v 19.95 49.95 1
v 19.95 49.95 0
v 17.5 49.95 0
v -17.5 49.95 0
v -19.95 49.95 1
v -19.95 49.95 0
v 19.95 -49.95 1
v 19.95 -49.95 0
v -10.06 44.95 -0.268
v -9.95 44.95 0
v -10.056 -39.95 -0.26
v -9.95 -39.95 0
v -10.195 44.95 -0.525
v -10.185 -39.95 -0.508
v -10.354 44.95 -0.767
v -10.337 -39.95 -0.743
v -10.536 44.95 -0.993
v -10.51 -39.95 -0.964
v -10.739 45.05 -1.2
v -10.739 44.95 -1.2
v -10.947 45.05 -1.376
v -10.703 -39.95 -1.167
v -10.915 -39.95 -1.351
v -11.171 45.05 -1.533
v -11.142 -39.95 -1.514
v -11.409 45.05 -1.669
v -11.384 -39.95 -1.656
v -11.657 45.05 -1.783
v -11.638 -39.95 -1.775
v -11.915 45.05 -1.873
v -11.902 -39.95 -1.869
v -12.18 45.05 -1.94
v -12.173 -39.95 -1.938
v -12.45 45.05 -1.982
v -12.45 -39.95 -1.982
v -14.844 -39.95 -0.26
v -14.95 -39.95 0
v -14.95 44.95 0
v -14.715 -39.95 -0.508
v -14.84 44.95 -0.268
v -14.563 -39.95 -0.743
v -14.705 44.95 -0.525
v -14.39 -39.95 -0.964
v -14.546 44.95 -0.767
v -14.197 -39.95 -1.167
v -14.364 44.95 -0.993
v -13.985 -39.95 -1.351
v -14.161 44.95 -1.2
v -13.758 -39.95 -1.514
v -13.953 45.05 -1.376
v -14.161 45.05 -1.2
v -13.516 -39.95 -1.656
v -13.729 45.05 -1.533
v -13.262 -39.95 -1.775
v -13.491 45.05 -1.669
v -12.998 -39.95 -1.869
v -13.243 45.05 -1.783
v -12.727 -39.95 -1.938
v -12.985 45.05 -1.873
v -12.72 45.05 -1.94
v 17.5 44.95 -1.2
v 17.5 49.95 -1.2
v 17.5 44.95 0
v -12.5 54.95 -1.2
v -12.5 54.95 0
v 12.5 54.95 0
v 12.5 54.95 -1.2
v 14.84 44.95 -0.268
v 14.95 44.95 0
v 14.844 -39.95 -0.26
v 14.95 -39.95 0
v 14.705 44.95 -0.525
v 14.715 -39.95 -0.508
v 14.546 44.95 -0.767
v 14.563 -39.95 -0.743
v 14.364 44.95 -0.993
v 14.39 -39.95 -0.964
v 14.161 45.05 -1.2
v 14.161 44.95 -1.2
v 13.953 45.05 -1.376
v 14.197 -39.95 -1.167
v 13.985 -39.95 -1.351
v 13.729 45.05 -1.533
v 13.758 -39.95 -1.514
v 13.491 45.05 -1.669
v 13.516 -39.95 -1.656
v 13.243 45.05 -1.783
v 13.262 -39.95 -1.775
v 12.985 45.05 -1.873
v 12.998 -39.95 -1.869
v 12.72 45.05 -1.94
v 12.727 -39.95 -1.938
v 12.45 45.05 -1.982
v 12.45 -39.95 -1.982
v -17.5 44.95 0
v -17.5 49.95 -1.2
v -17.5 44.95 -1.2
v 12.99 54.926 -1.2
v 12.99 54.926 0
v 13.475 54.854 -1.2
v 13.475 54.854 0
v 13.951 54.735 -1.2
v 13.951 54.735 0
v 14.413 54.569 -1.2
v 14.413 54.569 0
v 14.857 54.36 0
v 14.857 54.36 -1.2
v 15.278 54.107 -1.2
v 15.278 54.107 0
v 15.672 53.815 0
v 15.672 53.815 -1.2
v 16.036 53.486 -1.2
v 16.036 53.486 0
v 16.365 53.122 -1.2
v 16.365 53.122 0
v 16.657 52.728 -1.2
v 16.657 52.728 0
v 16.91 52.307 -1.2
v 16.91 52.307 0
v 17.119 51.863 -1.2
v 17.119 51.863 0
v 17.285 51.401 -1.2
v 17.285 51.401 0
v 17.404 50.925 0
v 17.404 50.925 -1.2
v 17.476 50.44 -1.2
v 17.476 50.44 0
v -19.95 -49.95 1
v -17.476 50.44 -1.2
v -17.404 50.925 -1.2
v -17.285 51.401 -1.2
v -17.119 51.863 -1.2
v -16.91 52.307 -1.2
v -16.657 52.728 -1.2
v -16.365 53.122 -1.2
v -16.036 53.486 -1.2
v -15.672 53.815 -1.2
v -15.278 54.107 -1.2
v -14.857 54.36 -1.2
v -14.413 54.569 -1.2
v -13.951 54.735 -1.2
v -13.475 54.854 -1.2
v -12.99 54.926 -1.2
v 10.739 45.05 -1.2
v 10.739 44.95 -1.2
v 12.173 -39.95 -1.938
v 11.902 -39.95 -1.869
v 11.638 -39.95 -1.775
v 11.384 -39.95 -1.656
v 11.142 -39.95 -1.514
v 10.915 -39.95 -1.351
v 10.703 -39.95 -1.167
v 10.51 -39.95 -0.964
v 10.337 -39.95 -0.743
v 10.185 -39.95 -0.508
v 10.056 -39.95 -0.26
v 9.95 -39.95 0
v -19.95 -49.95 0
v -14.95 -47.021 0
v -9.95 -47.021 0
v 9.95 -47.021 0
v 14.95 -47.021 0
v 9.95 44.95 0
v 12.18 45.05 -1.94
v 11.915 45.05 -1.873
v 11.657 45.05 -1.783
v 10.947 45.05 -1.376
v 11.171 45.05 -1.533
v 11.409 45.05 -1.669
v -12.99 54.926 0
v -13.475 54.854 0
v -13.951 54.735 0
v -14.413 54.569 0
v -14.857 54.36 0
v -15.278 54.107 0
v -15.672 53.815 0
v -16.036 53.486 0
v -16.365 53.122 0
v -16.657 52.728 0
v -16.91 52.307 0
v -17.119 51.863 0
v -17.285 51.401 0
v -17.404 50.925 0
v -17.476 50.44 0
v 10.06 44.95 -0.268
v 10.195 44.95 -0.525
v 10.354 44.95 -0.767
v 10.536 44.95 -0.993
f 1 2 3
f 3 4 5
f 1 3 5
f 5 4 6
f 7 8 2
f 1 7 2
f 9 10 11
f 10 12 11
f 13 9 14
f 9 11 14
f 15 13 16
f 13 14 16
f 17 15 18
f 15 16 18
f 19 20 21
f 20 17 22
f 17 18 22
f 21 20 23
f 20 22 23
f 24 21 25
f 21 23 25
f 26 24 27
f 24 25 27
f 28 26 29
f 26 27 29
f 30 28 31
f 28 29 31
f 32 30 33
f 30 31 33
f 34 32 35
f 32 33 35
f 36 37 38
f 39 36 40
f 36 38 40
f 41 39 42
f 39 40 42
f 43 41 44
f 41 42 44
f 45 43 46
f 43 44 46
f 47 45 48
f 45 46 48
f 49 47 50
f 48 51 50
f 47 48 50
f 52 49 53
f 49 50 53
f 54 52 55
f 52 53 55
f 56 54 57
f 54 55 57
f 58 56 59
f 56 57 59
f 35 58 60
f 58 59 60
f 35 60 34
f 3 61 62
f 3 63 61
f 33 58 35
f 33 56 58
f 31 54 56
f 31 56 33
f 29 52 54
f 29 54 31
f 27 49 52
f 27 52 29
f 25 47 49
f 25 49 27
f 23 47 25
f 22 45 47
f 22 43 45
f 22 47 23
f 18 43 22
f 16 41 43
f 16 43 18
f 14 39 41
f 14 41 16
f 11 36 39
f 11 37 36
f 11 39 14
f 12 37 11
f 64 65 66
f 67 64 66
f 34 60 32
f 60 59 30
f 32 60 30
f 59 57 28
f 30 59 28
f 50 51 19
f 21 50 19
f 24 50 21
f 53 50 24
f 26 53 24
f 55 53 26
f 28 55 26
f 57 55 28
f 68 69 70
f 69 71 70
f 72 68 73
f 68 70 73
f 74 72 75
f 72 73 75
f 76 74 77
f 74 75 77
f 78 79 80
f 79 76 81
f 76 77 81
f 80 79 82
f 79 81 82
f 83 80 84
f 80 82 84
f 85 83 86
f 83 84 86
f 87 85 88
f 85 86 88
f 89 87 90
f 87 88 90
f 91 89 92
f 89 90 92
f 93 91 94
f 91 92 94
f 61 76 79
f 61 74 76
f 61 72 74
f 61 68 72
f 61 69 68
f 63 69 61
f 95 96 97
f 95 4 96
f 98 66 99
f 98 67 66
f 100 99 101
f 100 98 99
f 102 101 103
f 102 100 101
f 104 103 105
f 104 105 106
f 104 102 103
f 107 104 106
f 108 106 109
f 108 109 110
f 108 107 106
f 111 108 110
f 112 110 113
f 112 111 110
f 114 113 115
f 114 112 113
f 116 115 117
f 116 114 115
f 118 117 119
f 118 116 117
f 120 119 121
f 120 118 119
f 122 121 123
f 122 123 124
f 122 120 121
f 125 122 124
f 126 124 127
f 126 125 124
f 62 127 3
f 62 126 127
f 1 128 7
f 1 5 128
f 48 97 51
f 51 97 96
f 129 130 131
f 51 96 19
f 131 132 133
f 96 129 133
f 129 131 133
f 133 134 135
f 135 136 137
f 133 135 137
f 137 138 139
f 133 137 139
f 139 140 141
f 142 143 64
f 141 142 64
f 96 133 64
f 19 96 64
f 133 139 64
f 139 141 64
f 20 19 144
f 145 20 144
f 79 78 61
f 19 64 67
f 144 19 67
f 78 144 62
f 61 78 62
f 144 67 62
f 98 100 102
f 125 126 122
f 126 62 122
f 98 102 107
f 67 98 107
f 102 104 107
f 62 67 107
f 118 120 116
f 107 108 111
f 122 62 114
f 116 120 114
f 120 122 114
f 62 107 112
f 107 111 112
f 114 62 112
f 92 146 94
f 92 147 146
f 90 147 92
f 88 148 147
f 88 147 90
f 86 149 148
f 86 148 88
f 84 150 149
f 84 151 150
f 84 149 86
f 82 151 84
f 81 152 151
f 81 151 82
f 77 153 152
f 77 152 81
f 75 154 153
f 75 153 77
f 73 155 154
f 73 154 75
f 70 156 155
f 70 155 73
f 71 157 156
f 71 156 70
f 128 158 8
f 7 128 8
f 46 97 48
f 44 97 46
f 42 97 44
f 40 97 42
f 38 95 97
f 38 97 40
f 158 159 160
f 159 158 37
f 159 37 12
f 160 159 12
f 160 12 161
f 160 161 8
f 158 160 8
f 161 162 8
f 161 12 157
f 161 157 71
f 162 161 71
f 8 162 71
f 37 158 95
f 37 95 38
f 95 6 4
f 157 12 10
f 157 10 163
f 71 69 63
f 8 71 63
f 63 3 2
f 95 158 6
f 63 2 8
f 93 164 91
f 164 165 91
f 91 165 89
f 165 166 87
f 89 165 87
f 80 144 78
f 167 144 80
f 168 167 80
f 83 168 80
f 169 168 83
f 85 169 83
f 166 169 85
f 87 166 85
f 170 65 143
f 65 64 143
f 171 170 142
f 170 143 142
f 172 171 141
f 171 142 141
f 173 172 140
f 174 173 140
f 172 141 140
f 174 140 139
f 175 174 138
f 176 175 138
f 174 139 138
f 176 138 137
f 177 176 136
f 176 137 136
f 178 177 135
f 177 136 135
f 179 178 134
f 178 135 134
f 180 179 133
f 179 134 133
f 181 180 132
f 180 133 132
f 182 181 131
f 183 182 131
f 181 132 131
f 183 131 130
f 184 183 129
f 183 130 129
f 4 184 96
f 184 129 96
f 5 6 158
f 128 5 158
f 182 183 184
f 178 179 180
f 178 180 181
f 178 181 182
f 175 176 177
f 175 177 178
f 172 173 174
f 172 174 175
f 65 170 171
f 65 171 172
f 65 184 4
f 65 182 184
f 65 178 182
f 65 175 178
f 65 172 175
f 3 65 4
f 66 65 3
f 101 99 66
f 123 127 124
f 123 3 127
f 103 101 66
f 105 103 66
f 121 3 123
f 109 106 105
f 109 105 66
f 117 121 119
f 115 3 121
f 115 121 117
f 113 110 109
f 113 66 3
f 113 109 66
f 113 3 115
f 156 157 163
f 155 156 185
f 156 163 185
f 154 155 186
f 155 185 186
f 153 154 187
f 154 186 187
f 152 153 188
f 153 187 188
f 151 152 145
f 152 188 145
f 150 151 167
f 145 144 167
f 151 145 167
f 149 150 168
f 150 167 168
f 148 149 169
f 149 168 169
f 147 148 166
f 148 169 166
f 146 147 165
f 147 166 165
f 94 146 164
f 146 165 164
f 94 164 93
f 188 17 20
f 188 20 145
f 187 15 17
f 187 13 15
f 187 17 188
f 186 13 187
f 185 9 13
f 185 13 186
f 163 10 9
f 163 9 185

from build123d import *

# Parameters (mm, degrees)
F0_W         = 35
F0_H         = 5
F1_DEPTH     = 1
F2_DEPTH     = 1.2
F3_W         = 5
F3_H         = 85
F4_DEPTH     = 2
F5_T4_DEPTH  = 99.1421356237
F5_T9_DEPTH  = 99.1421356237
F5_T14_DEPTH = 99.1421356237
F5_T19_DEPTH = 99.1421356237
F5_T24_DEPTH = 99.1421356237
F5_T29_DEPTH = 99.1421356237
F5_T34_DEPTH = 99.1421356237
F5_T39_DEPTH = 99.1421356237
F6_R         = 5


# Not quite as in the source:
# - a fillet or chamfer that OpenCascade refuses, or shapes differently, is made with other operations: its cross-section is extruded or revolved along the edge and cut away or added


with BuildPart() as f1:
    # F0 (on Top) → F1 (new body)
    with BuildSketch(Plane.XY):
        Polygon((-19.95, -49.95), (19.95, -49.95), (19.95, 49.95), (17.5, 49.95), (17.5, 44.95), (-17.5, 44.95), (-17.5, 49.95), (-19.95, 49.95), align=None)
        with Locations((0, 47.45)):
            Rectangle(F0_W, F0_H)
    extrude(amount=F1_DEPTH)

    # F0 (on Top) → F2 (join)
    with BuildSketch(Plane.XY):
        with Locations((0, 52.45)):
            Rectangle(F0_W, F0_H)
        with Locations((0, 47.45)):
            Rectangle(F0_W, F0_H)
    extrude(amount=-F2_DEPTH)

    # F3 (on face) → F4 (join)
    with BuildSketch(Plane.XY):
        with Locations((-12.45, 2.55)):
            Rectangle(F3_W, F3_H)
        with Locations((12.45, 2.55)):
            Rectangle(F3_W, F3_H)
    extrude(amount=-F4_DEPTH)

    # F5: fillet of radius 3 on 4 edges, made by hand


with BuildPart() as f5_tool2:
    # F5_s3 → F5_t4 (new body)
    with BuildSketch(Plane.XZ.offset(-52.1210678119)):
        with BuildLine():
            ThreePointArc((-14.95, 0), (-13.8536236828, -1.4494897428), (-12.1215728753, -2))
            Line((-12.1215728753, -2), (-14.95, -2))
            Line((-14.95, -2), (-14.95, 0))
        make_face()
    extrude(amount=F5_T4_DEPTH)

    split(bisect_by=Plane.XY.offset(-1.2), keep=Keep.BOTTOM)


with BuildPart() as f1_1:
    add(f1.part)

    # F5_t1: cut F5_tool2
    add(f5_tool2.part, mode=Mode.SUBTRACT)


with BuildPart() as f5_tool7:
    # F5_s8 → F5_t9 (new body)
    with BuildSketch(Plane.XZ.offset(-52.1210678119)):
        with BuildLine():
            ThreePointArc((-14.95, 0), (-13.8536236828, -1.4494897428), (-12.1215728753, -2))
            Line((-12.1215728753, -2), (-14.95, -2))
            Line((-14.95, -2), (-14.95, 0))
        make_face()
    extrude(amount=F5_T9_DEPTH)

    split(bisect_by=Plane.XZ.offset(-44.95), keep=Keep.TOP)


with BuildPart() as f1_2:
    add(f1_1.part)

    # F5_t6: cut F5_tool7
    add(f5_tool7.part, mode=Mode.SUBTRACT)


with BuildPart() as f5_tool12:
    # F5_s13 → F5_t14 (new body)
    with BuildSketch(Plane.XZ.offset(47.0210678119)):
        with BuildLine():
            ThreePointArc((-9.95, 0), (-11.0463763172, -1.4494897428), (-12.7784271247, -2))
            Line((-12.7784271247, -2), (-9.95, -2))
            Line((-9.95, -2), (-9.95, 0))
        make_face()
    extrude(amount=-F5_T14_DEPTH)

    split(bisect_by=Plane.XZ.offset(-44.95), keep=Keep.TOP)


with BuildPart() as f1_3:
    add(f1_2.part)

    # F5_t11: cut F5_tool12
    add(f5_tool12.part, mode=Mode.SUBTRACT)


with BuildPart() as f5_tool17:
    # F5_s18 → F5_t19 (new body)
    with BuildSketch(Plane.XZ.offset(47.0210678119)):
        with BuildLine():
            ThreePointArc((-9.95, 0), (-11.0463763172, -1.4494897428), (-12.7784271247, -2))
            Line((-12.7784271247, -2), (-9.95, -2))
            Line((-9.95, -2), (-9.95, 0))
        make_face()
    extrude(amount=-F5_T19_DEPTH)

    split(bisect_by=Plane.XY.offset(-1.2), keep=Keep.BOTTOM)


with BuildPart() as f1_4:
    add(f1_3.part)

    # F5_t16: cut F5_tool17
    add(f5_tool17.part, mode=Mode.SUBTRACT)


with BuildPart() as f5_tool22:
    # F5_s23 → F5_t24 (new body)
    with BuildSketch(Plane.XZ.offset(47.0210678119)):
        with BuildLine():
            ThreePointArc((14.95, 0), (13.8536236828, -1.4494897428), (12.1215728753, -2))
            Line((12.1215728753, -2), (14.95, -2))
            Line((14.95, -2), (14.95, 0))
        make_face()
    extrude(amount=-F5_T24_DEPTH)

    split(bisect_by=Plane.XZ.offset(-44.95), keep=Keep.TOP)


with BuildPart() as f1_5:
    add(f1_4.part)

    # F5_t21: cut F5_tool22
    add(f5_tool22.part, mode=Mode.SUBTRACT)


with BuildPart() as f5_tool27:
    # F5_s28 → F5_t29 (new body)
    with BuildSketch(Plane.XZ.offset(47.0210678119)):
        with BuildLine():
            ThreePointArc((14.95, 0), (13.8536236828, -1.4494897428), (12.1215728753, -2))
            Line((12.1215728753, -2), (14.95, -2))
            Line((14.95, -2), (14.95, 0))
        make_face()
    extrude(amount=-F5_T29_DEPTH)

    split(bisect_by=Plane.XY.offset(-1.2), keep=Keep.BOTTOM)


with BuildPart() as f1_6:
    add(f1_5.part)

    # F5_t26: cut F5_tool27
    add(f5_tool27.part, mode=Mode.SUBTRACT)


with BuildPart() as f5_tool32:
    # F5_s33 → F5_t34 (new body)
    with BuildSketch(Plane.XZ.offset(-52.1210678119)):
        with BuildLine():
            ThreePointArc((9.95, 0), (11.0463763172, -1.4494897428), (12.7784271247, -2))
            Line((12.7784271247, -2), (9.95, -2))
            Line((9.95, -2), (9.95, 0))
        make_face()
    extrude(amount=F5_T34_DEPTH)

    split(bisect_by=Plane.XY.offset(-1.2), keep=Keep.BOTTOM)


with BuildPart() as f1_7:
    add(f1_6.part)

    # F5_t31: cut F5_tool32
    add(f5_tool32.part, mode=Mode.SUBTRACT)


with BuildPart() as f5_tool37:
    # F5_s38 → F5_t39 (new body)
    with BuildSketch(Plane.XZ.offset(-52.1210678119)):
        with BuildLine():
            ThreePointArc((9.95, 0), (11.0463763172, -1.4494897428), (12.7784271247, -2))
            Line((12.7784271247, -2), (9.95, -2))
            Line((9.95, -2), (9.95, 0))
        make_face()
    extrude(amount=F5_T39_DEPTH)

    split(bisect_by=Plane.XZ.offset(-44.95), keep=Keep.TOP)


with BuildPart() as f1_8:
    add(f1_7.part)

    # F5_t36: cut F5_tool37
    add(f5_tool37.part, mode=Mode.SUBTRACT)

    # F6
    f6_edges = [f1_8.edges().sort_by_distance(p)[0] for p in [
        (-17.5, 54.95, -0.6),
        (17.5, 54.95, -0.6),
    ]]
    fillet(f6_edges, radius=F6_R)


solid = f1_8.part
